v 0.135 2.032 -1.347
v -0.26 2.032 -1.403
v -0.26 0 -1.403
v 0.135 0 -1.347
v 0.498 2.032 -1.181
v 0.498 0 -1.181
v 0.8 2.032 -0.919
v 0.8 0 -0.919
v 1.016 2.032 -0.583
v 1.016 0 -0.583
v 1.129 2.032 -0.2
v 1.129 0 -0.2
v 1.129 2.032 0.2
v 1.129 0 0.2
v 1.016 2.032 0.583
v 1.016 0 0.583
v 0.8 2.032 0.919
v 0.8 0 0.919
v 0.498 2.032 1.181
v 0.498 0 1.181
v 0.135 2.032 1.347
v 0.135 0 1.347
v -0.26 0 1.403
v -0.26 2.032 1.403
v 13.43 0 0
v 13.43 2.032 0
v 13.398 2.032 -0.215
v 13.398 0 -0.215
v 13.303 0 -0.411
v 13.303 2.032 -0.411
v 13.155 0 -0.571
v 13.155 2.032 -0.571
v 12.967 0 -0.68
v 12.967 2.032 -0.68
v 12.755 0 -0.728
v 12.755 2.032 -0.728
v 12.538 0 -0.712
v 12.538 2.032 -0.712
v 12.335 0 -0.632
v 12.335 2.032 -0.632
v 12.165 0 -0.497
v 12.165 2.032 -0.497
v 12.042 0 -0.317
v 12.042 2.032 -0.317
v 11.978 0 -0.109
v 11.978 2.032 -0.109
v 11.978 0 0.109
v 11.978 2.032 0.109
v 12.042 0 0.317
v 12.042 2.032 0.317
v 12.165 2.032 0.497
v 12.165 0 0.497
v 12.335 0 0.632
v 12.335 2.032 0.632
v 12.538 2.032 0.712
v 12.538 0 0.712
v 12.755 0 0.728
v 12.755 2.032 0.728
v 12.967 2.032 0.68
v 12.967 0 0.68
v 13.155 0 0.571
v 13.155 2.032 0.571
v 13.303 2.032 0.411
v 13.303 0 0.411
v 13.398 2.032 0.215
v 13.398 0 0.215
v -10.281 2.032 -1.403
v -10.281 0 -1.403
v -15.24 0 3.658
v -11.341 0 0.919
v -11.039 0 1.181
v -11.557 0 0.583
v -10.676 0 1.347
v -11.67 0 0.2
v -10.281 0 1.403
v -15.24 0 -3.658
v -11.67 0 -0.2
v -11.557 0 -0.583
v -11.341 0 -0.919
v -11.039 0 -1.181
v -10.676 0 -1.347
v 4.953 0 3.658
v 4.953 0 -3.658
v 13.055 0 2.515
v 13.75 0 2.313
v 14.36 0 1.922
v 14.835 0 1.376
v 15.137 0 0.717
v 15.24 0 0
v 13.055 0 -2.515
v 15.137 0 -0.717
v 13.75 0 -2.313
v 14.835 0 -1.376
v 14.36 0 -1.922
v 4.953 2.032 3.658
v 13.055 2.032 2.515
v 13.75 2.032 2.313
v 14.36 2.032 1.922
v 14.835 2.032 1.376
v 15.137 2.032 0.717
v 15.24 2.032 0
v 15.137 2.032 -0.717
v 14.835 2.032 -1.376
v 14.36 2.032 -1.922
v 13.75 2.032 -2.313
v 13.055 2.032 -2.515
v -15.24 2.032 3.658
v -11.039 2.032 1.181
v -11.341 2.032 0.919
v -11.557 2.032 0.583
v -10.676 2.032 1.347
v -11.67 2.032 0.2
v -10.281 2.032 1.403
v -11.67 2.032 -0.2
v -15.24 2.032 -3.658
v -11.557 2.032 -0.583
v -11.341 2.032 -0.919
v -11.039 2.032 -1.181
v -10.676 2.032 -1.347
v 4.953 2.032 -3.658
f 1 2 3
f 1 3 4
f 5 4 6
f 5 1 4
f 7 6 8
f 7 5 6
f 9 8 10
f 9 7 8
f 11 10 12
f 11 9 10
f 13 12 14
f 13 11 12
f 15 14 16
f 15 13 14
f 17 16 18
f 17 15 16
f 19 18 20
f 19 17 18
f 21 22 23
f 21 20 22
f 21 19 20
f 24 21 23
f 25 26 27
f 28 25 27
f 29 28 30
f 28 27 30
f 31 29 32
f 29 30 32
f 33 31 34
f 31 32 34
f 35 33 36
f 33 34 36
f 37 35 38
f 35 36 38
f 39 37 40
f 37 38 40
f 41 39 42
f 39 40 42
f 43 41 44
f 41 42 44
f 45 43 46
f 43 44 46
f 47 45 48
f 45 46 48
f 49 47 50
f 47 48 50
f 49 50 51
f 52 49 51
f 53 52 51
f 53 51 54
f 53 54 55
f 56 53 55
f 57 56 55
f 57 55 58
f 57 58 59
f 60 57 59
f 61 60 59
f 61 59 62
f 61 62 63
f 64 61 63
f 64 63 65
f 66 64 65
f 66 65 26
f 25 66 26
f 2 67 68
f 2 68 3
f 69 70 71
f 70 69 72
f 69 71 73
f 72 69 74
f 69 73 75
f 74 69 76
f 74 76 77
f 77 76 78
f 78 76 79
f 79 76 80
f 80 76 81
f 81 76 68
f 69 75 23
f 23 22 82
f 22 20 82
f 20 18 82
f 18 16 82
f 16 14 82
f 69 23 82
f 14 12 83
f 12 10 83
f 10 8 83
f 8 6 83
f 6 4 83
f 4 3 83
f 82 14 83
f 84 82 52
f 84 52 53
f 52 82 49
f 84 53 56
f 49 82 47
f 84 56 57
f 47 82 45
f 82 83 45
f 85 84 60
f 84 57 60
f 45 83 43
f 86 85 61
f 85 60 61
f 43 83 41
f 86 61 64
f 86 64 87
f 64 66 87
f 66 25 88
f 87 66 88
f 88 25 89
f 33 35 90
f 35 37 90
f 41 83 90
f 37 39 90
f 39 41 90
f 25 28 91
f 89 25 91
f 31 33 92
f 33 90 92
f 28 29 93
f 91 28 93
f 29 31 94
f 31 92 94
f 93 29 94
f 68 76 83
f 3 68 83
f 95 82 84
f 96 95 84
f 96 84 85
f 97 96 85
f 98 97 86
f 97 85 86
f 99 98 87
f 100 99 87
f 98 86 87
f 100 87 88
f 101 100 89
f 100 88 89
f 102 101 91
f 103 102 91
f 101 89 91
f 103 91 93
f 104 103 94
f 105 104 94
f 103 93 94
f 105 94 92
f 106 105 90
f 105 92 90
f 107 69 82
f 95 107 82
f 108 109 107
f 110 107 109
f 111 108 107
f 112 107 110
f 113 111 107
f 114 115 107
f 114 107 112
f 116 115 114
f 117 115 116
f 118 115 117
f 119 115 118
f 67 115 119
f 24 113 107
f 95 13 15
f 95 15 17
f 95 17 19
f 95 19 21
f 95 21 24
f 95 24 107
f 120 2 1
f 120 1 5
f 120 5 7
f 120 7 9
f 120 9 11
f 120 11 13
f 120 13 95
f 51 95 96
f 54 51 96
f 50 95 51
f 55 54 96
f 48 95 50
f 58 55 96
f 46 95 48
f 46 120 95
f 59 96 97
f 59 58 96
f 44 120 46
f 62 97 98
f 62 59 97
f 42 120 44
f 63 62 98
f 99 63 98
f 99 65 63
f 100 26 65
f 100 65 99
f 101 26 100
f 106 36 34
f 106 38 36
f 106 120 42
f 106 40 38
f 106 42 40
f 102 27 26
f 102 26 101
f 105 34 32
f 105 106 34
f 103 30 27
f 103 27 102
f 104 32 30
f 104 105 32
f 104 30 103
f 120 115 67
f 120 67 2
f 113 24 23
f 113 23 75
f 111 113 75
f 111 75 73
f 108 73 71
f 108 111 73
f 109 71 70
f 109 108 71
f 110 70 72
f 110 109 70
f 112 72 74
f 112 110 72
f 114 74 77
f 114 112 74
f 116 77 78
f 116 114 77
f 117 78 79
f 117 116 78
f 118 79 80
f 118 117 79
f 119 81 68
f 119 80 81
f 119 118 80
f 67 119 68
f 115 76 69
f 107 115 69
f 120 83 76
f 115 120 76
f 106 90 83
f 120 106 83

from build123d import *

# Parameters (mm, degrees)
BOSS_EXTRUDE1_DEPTH = 2.032
CUT_EXTRUDE1_REACH  = 4.032
CUT_EXTRUDE2_REACH  = 4.032
SKETCH3_R           = 0.73025


with BuildPart() as part:
    # Sketch1 → Boss-Extrude1 (new body)
    with BuildSketch(Plane(origin=(0, 0, 0), x_dir=(1, 0, 0), z_dir=(0, 1, 0))):
        with BuildLine():
            Line((-15.24, 3.6576), (-15.24, -3.6576))
            Line((-15.24, -3.6576), (4.953, -3.6576))
            Line((4.953, -3.6576), (13.054677298, -2.51511511))
            ThreePointArc((13.054677298, -2.51511511), (15.24, 0), (13.054677298, 2.51511511))
            Line((13.054677298, 2.51511511), (4.953, 3.6576))
            Line((4.953, 3.6576), (-15.24, 3.6576))
        make_face()
    extrude(amount=BOSS_EXTRUDE1_DEPTH)

    # Sketch2 → Cut-Extrude1 (cut, up to next)
    with BuildSketch(Plane(origin=(0, 2.032, 0), x_dir=(1, 0, 0), z_dir=(0, 1, 0)), mode=Mode.PRIVATE) as cut_extrude1_sk1:
        with BuildLine():
            Line((-10.28065, 1.40335), (-0.26035, 1.40335))
            ThreePointArc((-0.26035, 1.40335), (1.143, 0), (-0.26035, -1.40335))
            Line((-0.26035, -1.40335), (-10.28065, -1.40335))
            ThreePointArc((-10.28065, -1.40335), (-11.684, 0), (-10.28065, 1.40335))
        make_face()
    cut_extrude1_tool1 = extrude(cut_extrude1_sk1.sketch, amount=-CUT_EXTRUDE1_REACH, mode=Mode.PRIVATE) & part.part
    add(cut_extrude1_tool1.solids().sort_by_distance((-5.2705, 2.032, 0))[0], mode=Mode.SUBTRACT)

    # Sketch3 → Cut-Extrude2 (cut, up to next)
    with BuildSketch(Plane(origin=(0, 2.032, 0), x_dir=(1, 0, 0), z_dir=(0, 1, 0)), mode=Mode.PRIVATE) as cut_extrude2_sk1:
        with Locations((12.7, 0)):
            Circle(SKETCH3_R)
    cut_extrude2_tool1 = extrude(cut_extrude2_sk1.sketch, amount=-CUT_EXTRUDE2_REACH, mode=Mode.PRIVATE) & part.part
    add(cut_extrude2_tool1.solids().sort_by_distance((12.7, 2.032, 0))[0], mode=Mode.SUBTRACT)


solid = part.part
